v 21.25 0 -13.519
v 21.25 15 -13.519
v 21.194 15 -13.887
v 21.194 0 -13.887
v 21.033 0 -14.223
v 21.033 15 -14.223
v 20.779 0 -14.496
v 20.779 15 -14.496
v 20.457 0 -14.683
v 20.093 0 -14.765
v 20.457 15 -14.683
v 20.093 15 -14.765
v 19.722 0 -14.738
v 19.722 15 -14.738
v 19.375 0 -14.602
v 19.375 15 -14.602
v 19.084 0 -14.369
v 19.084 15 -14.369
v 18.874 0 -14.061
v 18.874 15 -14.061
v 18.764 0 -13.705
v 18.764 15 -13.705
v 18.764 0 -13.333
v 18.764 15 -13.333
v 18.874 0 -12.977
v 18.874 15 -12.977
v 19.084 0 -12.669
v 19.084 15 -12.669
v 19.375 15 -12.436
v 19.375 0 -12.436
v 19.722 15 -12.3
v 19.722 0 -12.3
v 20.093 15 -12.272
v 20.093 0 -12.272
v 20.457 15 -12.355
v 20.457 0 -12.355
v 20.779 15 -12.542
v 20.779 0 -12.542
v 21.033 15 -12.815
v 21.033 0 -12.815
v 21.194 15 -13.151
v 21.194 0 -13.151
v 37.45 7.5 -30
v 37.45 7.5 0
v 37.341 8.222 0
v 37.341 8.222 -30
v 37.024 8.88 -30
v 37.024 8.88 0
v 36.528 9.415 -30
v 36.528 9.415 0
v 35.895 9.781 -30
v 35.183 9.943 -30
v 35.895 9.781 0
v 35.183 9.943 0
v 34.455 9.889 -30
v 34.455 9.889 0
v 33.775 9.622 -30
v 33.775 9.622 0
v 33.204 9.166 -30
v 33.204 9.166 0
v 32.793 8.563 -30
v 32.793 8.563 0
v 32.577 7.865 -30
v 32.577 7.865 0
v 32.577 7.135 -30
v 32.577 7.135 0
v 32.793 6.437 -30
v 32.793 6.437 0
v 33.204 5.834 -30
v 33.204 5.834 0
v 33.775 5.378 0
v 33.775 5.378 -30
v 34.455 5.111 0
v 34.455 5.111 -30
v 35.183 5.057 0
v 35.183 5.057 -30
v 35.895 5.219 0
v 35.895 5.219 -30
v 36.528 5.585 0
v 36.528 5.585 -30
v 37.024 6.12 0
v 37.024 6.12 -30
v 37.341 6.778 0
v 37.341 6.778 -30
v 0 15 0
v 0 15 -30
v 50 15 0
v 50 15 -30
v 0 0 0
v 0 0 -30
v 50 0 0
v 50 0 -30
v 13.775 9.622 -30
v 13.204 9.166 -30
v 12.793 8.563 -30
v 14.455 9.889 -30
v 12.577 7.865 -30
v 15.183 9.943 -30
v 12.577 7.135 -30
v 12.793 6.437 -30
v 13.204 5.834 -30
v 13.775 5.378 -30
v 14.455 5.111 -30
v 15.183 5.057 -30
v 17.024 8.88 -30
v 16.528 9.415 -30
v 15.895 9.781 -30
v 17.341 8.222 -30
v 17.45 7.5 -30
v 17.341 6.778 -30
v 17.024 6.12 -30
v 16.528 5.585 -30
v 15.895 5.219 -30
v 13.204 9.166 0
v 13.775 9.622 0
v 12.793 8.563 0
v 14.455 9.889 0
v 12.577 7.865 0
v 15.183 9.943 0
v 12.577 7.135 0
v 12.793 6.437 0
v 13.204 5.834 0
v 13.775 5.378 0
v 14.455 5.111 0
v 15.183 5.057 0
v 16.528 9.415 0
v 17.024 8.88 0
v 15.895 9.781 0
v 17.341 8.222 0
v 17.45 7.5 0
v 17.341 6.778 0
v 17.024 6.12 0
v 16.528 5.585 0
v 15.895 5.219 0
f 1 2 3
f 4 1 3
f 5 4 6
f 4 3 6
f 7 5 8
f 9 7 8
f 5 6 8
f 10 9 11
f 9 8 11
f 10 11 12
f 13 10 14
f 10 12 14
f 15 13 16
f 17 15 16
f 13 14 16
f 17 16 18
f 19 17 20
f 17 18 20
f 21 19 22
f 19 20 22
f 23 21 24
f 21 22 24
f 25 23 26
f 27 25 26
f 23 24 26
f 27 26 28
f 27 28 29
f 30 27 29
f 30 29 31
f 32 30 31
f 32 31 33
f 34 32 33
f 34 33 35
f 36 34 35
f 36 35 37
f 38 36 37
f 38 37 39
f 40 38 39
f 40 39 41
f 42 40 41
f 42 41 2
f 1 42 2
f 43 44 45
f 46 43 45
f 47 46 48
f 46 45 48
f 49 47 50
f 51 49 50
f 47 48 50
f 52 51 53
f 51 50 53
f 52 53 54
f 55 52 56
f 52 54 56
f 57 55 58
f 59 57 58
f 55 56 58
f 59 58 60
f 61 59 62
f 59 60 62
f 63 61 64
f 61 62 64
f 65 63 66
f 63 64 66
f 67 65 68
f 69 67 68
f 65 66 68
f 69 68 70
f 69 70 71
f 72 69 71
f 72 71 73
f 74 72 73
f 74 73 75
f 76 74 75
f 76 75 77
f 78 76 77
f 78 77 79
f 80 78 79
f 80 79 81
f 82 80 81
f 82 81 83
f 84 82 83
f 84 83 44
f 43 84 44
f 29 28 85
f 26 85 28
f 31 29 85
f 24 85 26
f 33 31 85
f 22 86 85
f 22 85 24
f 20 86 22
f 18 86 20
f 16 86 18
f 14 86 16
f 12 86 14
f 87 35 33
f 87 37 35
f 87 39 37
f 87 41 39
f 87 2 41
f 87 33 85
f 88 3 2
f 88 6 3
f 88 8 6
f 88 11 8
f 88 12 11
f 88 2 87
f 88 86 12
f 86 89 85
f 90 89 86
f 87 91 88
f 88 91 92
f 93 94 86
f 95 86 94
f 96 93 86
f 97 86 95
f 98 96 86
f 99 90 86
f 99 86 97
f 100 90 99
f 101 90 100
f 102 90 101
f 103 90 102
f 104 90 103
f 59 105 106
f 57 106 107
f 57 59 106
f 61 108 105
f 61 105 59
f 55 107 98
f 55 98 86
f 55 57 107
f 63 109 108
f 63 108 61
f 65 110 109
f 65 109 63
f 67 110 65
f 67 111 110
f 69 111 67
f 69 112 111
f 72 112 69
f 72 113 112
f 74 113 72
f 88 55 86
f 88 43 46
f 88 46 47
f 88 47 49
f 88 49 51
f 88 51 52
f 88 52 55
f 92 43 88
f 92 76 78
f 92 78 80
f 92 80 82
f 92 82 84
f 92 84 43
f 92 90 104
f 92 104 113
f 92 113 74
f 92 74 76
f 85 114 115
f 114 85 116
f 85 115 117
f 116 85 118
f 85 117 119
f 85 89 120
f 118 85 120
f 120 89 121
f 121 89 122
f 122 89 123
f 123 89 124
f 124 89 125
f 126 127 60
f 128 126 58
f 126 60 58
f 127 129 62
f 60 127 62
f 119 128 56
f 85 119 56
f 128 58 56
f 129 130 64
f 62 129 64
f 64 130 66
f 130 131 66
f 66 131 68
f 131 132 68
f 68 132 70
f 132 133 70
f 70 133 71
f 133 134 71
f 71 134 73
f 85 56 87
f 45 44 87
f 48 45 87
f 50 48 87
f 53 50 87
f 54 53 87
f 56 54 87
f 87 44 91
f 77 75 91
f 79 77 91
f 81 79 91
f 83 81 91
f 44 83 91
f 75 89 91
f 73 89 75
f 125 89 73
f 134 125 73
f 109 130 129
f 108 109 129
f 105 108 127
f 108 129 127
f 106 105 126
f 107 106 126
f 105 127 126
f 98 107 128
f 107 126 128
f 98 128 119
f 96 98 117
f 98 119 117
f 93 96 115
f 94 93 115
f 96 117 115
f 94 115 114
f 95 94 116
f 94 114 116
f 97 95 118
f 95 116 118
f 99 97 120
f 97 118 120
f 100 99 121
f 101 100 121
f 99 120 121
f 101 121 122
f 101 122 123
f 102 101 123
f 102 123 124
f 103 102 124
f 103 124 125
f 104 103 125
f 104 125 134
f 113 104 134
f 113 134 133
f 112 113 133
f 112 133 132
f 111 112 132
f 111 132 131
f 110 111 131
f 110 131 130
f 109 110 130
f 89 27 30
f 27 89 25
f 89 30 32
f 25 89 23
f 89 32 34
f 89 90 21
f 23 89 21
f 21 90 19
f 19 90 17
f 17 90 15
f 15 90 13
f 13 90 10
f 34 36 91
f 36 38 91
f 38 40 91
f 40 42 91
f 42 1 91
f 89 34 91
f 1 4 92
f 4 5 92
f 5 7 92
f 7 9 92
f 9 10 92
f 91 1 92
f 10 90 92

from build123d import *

# Parameters (mm, degrees)
SKETCH1_W           = 50
SKETCH1_H           = 30
BOSS_EXTRUDE1_DEPTH = 15
SKETCH2_R           = 2.45
CUT_EXTRUDE1_DEPTH  = 31
SKETCH3_R           = 1.25
CUT_EXTRUDE2_DEPTH  = 16


with BuildPart() as part:
    # Sketch1 → Boss-Extrude1 (new body)
    with BuildSketch(Plane(origin=(0, 0, 0), x_dir=(1, 0, 0), z_dir=(0, 1, 0))):
        with Locations((25, 15)):
            Rectangle(SKETCH1_W, SKETCH1_H)
    extrude(amount=BOSS_EXTRUDE1_DEPTH)

    # Sketch2 → Cut-Extrude1 (cut, through all)
    with BuildSketch(Plane.XY):
        with Locations((35, 7.5)):
            Circle(SKETCH2_R)
        with Locations((15, 7.5)):
            Circle(SKETCH2_R)
    extrude(amount=-CUT_EXTRUDE1_DEPTH, mode=Mode.SUBTRACT)

    # Sketch3 → Cut-Extrude2 (cut, through all)
    with BuildSketch(Plane(origin=(0, 15, 0), x_dir=(1, 0, 0), z_dir=(0, 1, 0))):
        with Locations((20, 13.518993942)):
            Circle(SKETCH3_R)
    extrude(amount=-CUT_EXTRUDE2_DEPTH, mode=Mode.SUBTRACT)


solid = part.part
